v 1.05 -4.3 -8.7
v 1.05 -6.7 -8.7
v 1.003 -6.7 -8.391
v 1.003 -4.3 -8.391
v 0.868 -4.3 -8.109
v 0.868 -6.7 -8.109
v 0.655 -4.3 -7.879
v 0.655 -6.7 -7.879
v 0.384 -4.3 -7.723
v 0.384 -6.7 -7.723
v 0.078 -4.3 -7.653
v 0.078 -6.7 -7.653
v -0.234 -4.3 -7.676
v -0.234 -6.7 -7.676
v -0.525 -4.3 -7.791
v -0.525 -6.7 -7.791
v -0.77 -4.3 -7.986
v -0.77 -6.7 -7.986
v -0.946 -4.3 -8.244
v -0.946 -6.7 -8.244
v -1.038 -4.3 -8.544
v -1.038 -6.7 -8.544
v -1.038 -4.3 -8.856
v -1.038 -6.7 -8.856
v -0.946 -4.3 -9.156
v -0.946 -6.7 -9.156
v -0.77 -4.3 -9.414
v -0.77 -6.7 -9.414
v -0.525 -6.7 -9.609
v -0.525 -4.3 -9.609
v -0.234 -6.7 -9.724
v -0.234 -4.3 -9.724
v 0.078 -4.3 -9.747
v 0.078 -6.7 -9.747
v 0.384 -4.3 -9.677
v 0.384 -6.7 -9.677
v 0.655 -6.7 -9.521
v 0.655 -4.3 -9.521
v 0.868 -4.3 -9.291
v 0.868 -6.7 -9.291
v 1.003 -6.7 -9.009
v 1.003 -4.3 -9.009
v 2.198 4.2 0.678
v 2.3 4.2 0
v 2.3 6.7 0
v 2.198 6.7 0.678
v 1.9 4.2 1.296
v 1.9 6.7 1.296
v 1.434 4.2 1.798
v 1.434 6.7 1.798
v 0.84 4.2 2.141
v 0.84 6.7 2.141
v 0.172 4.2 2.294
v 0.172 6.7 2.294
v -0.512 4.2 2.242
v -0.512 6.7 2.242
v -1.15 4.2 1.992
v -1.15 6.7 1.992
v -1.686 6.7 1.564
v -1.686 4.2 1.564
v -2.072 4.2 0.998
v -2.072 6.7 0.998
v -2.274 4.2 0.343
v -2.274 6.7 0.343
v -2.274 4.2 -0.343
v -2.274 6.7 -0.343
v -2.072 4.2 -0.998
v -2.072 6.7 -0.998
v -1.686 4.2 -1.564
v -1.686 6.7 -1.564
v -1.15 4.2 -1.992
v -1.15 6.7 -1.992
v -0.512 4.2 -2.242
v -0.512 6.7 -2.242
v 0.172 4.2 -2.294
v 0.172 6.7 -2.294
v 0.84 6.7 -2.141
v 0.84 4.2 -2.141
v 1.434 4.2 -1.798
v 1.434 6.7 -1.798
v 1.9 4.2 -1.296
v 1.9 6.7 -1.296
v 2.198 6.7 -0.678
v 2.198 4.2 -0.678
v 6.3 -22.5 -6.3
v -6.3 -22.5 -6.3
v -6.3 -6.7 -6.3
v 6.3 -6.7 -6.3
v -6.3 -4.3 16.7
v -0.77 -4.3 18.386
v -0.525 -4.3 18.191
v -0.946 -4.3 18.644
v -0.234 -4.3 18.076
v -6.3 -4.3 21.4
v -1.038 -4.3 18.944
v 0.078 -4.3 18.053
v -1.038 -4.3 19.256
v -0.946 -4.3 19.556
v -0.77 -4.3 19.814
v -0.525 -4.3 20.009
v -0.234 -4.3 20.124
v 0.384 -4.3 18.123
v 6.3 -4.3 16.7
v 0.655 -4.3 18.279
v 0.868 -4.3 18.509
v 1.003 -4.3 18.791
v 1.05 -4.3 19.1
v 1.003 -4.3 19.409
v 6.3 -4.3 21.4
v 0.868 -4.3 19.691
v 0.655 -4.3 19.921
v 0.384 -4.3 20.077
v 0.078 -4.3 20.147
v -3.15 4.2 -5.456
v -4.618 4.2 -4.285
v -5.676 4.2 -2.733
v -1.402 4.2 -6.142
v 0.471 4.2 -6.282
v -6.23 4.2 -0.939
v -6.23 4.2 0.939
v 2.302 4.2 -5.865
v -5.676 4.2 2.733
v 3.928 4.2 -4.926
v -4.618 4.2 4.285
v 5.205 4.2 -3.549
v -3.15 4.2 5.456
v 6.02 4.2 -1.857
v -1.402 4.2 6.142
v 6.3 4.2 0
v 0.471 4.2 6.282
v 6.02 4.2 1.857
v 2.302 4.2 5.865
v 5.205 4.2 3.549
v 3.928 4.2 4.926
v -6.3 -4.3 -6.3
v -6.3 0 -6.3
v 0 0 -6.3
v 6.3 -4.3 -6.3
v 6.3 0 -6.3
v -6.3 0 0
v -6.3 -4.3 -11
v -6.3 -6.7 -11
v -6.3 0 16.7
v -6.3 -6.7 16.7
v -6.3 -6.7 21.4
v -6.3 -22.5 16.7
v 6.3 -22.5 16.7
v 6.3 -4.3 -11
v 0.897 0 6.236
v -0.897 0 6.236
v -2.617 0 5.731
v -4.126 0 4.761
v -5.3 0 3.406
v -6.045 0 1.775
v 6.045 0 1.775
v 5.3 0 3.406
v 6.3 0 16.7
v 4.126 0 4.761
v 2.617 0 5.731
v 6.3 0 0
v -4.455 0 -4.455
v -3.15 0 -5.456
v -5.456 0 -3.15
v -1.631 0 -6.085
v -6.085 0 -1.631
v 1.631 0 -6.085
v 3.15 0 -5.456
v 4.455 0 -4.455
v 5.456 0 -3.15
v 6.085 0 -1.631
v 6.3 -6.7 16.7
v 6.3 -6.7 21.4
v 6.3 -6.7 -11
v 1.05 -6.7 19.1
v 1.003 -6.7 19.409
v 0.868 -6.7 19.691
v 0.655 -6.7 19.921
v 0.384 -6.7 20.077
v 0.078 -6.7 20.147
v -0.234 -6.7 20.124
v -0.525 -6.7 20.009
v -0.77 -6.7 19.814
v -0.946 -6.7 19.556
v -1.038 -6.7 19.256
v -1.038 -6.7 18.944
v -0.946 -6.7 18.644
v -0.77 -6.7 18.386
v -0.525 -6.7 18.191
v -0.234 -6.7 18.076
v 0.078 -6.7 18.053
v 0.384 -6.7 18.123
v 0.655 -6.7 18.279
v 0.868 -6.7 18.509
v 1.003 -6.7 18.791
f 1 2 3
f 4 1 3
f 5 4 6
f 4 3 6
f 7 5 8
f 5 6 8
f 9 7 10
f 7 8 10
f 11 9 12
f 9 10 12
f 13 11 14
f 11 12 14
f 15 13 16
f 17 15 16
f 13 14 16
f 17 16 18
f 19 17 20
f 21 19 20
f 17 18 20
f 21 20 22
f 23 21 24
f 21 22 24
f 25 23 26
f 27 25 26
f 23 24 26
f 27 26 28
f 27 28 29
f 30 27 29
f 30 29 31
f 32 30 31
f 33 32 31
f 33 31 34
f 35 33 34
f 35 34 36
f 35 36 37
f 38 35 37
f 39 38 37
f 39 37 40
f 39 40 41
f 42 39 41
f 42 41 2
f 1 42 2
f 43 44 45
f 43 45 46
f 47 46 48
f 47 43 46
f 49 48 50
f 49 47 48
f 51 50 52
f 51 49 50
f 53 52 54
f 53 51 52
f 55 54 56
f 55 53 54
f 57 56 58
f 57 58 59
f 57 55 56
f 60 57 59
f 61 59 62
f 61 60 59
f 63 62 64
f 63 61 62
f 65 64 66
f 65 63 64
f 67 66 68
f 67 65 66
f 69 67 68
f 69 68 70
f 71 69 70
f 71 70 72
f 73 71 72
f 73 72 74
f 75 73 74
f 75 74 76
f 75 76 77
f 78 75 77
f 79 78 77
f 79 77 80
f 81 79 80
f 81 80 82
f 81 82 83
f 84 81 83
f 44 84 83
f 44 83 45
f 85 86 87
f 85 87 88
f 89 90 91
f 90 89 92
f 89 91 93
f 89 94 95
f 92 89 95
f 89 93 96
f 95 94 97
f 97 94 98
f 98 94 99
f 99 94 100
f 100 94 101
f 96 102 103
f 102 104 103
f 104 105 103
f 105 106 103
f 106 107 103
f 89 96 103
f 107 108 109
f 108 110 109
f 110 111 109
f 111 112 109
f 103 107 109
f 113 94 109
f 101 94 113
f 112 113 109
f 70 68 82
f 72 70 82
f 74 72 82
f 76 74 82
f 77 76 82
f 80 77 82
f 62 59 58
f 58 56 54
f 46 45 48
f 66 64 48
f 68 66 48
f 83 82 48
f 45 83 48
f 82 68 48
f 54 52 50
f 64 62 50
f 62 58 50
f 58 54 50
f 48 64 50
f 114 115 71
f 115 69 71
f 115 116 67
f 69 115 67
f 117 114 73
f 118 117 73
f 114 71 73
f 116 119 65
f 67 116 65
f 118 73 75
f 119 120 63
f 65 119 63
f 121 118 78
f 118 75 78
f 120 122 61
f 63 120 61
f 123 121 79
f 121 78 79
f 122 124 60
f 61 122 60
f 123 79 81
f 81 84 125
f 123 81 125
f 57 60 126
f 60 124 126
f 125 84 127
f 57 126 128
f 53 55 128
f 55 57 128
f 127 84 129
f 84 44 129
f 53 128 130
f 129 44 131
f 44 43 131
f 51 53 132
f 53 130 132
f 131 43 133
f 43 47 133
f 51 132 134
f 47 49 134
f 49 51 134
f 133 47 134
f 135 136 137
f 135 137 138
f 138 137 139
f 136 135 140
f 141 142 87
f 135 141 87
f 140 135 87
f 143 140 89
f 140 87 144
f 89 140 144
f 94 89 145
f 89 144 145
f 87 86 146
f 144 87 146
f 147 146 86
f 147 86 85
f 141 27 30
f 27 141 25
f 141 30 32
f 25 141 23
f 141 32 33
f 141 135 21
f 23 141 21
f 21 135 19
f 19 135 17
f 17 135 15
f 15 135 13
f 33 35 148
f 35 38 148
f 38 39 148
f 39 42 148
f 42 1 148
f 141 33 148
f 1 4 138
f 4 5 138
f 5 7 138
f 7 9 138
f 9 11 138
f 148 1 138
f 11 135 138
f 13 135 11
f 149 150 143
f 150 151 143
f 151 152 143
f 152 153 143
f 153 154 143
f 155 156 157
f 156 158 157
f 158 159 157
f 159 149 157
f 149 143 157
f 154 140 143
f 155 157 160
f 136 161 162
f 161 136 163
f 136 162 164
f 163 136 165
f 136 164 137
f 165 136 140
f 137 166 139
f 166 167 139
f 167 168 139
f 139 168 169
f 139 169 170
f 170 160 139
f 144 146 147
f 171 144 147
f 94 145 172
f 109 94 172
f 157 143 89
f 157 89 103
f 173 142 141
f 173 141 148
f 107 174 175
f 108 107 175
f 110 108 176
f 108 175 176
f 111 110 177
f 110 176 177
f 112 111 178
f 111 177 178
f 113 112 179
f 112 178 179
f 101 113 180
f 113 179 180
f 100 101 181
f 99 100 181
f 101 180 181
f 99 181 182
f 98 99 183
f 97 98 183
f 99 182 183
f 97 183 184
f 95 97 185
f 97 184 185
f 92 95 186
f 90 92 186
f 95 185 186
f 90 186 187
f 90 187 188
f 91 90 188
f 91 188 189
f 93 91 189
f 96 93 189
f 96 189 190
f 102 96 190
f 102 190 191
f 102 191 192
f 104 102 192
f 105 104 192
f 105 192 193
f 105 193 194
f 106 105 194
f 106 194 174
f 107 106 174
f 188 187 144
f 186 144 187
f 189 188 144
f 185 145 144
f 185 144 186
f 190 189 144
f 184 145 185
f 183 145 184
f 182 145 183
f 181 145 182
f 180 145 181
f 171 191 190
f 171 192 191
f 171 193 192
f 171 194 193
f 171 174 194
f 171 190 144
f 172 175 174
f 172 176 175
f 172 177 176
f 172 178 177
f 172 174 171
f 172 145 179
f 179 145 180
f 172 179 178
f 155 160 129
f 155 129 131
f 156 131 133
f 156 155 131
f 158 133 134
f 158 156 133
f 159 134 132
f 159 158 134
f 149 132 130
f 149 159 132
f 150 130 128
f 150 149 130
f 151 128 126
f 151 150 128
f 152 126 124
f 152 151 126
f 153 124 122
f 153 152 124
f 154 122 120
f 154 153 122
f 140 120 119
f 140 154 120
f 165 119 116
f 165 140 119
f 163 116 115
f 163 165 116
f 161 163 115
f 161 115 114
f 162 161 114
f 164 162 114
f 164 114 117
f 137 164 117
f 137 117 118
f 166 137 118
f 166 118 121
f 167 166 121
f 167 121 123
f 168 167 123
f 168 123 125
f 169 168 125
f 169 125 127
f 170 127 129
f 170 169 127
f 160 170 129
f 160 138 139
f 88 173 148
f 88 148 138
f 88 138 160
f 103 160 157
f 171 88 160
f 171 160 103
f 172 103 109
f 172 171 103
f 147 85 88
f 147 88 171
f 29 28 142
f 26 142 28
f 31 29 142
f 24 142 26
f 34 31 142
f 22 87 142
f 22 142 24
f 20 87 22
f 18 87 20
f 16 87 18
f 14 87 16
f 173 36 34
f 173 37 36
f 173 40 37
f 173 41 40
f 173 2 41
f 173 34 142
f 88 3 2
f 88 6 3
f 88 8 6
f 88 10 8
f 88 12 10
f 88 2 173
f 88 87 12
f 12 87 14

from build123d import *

# Parameters (mm, degrees)
F0_W      = 12.6
F0_H      = 23
F1_DEPTH  = 22.5
F3_W      = 12.6
F3_H      = 32.4
F4_DEPTH  = 2.4
F5_R      = 1.05
F6_DEPTH  = 25
F7_R      = 6.3
F8_DEPTH  = 4.2
F9_R      = 2.3
F10_DEPTH = 6.7


with BuildPart() as f1:
    # F0 (on Front) → F1 (new body)
    with BuildSketch(Plane.XZ):
        with Locations((0, 5.2)):
            Rectangle(F0_W, F0_H)
    extrude(amount=F1_DEPTH)

    # F3 (on offset) → F4 (join)
    with BuildSketch(Plane.XZ.offset(6.7)):
        with Locations((0, 5.2)):
            Rectangle(F3_W, F3_H)
    extrude(amount=-F4_DEPTH)

    # F5 (on offset) → F6 (cut)
    with BuildSketch(Plane.XZ.offset(6.7)):
        with Locations((0, 19.1)):
            Circle(F5_R)
        with Locations((0, -8.7)):
            Circle(F5_R)
    extrude(amount=-F6_DEPTH, mode=Mode.SUBTRACT)

    # F7 (on Front) → F8 (join)
    with BuildSketch(Plane.XZ):
        Circle(F7_R)
    extrude(amount=-F8_DEPTH)

    # F9 (on Front) → F10 (join)
    with BuildSketch(Plane.XZ):
        Circle(F9_R)
    extrude(amount=-F10_DEPTH)


solid = f1.part
